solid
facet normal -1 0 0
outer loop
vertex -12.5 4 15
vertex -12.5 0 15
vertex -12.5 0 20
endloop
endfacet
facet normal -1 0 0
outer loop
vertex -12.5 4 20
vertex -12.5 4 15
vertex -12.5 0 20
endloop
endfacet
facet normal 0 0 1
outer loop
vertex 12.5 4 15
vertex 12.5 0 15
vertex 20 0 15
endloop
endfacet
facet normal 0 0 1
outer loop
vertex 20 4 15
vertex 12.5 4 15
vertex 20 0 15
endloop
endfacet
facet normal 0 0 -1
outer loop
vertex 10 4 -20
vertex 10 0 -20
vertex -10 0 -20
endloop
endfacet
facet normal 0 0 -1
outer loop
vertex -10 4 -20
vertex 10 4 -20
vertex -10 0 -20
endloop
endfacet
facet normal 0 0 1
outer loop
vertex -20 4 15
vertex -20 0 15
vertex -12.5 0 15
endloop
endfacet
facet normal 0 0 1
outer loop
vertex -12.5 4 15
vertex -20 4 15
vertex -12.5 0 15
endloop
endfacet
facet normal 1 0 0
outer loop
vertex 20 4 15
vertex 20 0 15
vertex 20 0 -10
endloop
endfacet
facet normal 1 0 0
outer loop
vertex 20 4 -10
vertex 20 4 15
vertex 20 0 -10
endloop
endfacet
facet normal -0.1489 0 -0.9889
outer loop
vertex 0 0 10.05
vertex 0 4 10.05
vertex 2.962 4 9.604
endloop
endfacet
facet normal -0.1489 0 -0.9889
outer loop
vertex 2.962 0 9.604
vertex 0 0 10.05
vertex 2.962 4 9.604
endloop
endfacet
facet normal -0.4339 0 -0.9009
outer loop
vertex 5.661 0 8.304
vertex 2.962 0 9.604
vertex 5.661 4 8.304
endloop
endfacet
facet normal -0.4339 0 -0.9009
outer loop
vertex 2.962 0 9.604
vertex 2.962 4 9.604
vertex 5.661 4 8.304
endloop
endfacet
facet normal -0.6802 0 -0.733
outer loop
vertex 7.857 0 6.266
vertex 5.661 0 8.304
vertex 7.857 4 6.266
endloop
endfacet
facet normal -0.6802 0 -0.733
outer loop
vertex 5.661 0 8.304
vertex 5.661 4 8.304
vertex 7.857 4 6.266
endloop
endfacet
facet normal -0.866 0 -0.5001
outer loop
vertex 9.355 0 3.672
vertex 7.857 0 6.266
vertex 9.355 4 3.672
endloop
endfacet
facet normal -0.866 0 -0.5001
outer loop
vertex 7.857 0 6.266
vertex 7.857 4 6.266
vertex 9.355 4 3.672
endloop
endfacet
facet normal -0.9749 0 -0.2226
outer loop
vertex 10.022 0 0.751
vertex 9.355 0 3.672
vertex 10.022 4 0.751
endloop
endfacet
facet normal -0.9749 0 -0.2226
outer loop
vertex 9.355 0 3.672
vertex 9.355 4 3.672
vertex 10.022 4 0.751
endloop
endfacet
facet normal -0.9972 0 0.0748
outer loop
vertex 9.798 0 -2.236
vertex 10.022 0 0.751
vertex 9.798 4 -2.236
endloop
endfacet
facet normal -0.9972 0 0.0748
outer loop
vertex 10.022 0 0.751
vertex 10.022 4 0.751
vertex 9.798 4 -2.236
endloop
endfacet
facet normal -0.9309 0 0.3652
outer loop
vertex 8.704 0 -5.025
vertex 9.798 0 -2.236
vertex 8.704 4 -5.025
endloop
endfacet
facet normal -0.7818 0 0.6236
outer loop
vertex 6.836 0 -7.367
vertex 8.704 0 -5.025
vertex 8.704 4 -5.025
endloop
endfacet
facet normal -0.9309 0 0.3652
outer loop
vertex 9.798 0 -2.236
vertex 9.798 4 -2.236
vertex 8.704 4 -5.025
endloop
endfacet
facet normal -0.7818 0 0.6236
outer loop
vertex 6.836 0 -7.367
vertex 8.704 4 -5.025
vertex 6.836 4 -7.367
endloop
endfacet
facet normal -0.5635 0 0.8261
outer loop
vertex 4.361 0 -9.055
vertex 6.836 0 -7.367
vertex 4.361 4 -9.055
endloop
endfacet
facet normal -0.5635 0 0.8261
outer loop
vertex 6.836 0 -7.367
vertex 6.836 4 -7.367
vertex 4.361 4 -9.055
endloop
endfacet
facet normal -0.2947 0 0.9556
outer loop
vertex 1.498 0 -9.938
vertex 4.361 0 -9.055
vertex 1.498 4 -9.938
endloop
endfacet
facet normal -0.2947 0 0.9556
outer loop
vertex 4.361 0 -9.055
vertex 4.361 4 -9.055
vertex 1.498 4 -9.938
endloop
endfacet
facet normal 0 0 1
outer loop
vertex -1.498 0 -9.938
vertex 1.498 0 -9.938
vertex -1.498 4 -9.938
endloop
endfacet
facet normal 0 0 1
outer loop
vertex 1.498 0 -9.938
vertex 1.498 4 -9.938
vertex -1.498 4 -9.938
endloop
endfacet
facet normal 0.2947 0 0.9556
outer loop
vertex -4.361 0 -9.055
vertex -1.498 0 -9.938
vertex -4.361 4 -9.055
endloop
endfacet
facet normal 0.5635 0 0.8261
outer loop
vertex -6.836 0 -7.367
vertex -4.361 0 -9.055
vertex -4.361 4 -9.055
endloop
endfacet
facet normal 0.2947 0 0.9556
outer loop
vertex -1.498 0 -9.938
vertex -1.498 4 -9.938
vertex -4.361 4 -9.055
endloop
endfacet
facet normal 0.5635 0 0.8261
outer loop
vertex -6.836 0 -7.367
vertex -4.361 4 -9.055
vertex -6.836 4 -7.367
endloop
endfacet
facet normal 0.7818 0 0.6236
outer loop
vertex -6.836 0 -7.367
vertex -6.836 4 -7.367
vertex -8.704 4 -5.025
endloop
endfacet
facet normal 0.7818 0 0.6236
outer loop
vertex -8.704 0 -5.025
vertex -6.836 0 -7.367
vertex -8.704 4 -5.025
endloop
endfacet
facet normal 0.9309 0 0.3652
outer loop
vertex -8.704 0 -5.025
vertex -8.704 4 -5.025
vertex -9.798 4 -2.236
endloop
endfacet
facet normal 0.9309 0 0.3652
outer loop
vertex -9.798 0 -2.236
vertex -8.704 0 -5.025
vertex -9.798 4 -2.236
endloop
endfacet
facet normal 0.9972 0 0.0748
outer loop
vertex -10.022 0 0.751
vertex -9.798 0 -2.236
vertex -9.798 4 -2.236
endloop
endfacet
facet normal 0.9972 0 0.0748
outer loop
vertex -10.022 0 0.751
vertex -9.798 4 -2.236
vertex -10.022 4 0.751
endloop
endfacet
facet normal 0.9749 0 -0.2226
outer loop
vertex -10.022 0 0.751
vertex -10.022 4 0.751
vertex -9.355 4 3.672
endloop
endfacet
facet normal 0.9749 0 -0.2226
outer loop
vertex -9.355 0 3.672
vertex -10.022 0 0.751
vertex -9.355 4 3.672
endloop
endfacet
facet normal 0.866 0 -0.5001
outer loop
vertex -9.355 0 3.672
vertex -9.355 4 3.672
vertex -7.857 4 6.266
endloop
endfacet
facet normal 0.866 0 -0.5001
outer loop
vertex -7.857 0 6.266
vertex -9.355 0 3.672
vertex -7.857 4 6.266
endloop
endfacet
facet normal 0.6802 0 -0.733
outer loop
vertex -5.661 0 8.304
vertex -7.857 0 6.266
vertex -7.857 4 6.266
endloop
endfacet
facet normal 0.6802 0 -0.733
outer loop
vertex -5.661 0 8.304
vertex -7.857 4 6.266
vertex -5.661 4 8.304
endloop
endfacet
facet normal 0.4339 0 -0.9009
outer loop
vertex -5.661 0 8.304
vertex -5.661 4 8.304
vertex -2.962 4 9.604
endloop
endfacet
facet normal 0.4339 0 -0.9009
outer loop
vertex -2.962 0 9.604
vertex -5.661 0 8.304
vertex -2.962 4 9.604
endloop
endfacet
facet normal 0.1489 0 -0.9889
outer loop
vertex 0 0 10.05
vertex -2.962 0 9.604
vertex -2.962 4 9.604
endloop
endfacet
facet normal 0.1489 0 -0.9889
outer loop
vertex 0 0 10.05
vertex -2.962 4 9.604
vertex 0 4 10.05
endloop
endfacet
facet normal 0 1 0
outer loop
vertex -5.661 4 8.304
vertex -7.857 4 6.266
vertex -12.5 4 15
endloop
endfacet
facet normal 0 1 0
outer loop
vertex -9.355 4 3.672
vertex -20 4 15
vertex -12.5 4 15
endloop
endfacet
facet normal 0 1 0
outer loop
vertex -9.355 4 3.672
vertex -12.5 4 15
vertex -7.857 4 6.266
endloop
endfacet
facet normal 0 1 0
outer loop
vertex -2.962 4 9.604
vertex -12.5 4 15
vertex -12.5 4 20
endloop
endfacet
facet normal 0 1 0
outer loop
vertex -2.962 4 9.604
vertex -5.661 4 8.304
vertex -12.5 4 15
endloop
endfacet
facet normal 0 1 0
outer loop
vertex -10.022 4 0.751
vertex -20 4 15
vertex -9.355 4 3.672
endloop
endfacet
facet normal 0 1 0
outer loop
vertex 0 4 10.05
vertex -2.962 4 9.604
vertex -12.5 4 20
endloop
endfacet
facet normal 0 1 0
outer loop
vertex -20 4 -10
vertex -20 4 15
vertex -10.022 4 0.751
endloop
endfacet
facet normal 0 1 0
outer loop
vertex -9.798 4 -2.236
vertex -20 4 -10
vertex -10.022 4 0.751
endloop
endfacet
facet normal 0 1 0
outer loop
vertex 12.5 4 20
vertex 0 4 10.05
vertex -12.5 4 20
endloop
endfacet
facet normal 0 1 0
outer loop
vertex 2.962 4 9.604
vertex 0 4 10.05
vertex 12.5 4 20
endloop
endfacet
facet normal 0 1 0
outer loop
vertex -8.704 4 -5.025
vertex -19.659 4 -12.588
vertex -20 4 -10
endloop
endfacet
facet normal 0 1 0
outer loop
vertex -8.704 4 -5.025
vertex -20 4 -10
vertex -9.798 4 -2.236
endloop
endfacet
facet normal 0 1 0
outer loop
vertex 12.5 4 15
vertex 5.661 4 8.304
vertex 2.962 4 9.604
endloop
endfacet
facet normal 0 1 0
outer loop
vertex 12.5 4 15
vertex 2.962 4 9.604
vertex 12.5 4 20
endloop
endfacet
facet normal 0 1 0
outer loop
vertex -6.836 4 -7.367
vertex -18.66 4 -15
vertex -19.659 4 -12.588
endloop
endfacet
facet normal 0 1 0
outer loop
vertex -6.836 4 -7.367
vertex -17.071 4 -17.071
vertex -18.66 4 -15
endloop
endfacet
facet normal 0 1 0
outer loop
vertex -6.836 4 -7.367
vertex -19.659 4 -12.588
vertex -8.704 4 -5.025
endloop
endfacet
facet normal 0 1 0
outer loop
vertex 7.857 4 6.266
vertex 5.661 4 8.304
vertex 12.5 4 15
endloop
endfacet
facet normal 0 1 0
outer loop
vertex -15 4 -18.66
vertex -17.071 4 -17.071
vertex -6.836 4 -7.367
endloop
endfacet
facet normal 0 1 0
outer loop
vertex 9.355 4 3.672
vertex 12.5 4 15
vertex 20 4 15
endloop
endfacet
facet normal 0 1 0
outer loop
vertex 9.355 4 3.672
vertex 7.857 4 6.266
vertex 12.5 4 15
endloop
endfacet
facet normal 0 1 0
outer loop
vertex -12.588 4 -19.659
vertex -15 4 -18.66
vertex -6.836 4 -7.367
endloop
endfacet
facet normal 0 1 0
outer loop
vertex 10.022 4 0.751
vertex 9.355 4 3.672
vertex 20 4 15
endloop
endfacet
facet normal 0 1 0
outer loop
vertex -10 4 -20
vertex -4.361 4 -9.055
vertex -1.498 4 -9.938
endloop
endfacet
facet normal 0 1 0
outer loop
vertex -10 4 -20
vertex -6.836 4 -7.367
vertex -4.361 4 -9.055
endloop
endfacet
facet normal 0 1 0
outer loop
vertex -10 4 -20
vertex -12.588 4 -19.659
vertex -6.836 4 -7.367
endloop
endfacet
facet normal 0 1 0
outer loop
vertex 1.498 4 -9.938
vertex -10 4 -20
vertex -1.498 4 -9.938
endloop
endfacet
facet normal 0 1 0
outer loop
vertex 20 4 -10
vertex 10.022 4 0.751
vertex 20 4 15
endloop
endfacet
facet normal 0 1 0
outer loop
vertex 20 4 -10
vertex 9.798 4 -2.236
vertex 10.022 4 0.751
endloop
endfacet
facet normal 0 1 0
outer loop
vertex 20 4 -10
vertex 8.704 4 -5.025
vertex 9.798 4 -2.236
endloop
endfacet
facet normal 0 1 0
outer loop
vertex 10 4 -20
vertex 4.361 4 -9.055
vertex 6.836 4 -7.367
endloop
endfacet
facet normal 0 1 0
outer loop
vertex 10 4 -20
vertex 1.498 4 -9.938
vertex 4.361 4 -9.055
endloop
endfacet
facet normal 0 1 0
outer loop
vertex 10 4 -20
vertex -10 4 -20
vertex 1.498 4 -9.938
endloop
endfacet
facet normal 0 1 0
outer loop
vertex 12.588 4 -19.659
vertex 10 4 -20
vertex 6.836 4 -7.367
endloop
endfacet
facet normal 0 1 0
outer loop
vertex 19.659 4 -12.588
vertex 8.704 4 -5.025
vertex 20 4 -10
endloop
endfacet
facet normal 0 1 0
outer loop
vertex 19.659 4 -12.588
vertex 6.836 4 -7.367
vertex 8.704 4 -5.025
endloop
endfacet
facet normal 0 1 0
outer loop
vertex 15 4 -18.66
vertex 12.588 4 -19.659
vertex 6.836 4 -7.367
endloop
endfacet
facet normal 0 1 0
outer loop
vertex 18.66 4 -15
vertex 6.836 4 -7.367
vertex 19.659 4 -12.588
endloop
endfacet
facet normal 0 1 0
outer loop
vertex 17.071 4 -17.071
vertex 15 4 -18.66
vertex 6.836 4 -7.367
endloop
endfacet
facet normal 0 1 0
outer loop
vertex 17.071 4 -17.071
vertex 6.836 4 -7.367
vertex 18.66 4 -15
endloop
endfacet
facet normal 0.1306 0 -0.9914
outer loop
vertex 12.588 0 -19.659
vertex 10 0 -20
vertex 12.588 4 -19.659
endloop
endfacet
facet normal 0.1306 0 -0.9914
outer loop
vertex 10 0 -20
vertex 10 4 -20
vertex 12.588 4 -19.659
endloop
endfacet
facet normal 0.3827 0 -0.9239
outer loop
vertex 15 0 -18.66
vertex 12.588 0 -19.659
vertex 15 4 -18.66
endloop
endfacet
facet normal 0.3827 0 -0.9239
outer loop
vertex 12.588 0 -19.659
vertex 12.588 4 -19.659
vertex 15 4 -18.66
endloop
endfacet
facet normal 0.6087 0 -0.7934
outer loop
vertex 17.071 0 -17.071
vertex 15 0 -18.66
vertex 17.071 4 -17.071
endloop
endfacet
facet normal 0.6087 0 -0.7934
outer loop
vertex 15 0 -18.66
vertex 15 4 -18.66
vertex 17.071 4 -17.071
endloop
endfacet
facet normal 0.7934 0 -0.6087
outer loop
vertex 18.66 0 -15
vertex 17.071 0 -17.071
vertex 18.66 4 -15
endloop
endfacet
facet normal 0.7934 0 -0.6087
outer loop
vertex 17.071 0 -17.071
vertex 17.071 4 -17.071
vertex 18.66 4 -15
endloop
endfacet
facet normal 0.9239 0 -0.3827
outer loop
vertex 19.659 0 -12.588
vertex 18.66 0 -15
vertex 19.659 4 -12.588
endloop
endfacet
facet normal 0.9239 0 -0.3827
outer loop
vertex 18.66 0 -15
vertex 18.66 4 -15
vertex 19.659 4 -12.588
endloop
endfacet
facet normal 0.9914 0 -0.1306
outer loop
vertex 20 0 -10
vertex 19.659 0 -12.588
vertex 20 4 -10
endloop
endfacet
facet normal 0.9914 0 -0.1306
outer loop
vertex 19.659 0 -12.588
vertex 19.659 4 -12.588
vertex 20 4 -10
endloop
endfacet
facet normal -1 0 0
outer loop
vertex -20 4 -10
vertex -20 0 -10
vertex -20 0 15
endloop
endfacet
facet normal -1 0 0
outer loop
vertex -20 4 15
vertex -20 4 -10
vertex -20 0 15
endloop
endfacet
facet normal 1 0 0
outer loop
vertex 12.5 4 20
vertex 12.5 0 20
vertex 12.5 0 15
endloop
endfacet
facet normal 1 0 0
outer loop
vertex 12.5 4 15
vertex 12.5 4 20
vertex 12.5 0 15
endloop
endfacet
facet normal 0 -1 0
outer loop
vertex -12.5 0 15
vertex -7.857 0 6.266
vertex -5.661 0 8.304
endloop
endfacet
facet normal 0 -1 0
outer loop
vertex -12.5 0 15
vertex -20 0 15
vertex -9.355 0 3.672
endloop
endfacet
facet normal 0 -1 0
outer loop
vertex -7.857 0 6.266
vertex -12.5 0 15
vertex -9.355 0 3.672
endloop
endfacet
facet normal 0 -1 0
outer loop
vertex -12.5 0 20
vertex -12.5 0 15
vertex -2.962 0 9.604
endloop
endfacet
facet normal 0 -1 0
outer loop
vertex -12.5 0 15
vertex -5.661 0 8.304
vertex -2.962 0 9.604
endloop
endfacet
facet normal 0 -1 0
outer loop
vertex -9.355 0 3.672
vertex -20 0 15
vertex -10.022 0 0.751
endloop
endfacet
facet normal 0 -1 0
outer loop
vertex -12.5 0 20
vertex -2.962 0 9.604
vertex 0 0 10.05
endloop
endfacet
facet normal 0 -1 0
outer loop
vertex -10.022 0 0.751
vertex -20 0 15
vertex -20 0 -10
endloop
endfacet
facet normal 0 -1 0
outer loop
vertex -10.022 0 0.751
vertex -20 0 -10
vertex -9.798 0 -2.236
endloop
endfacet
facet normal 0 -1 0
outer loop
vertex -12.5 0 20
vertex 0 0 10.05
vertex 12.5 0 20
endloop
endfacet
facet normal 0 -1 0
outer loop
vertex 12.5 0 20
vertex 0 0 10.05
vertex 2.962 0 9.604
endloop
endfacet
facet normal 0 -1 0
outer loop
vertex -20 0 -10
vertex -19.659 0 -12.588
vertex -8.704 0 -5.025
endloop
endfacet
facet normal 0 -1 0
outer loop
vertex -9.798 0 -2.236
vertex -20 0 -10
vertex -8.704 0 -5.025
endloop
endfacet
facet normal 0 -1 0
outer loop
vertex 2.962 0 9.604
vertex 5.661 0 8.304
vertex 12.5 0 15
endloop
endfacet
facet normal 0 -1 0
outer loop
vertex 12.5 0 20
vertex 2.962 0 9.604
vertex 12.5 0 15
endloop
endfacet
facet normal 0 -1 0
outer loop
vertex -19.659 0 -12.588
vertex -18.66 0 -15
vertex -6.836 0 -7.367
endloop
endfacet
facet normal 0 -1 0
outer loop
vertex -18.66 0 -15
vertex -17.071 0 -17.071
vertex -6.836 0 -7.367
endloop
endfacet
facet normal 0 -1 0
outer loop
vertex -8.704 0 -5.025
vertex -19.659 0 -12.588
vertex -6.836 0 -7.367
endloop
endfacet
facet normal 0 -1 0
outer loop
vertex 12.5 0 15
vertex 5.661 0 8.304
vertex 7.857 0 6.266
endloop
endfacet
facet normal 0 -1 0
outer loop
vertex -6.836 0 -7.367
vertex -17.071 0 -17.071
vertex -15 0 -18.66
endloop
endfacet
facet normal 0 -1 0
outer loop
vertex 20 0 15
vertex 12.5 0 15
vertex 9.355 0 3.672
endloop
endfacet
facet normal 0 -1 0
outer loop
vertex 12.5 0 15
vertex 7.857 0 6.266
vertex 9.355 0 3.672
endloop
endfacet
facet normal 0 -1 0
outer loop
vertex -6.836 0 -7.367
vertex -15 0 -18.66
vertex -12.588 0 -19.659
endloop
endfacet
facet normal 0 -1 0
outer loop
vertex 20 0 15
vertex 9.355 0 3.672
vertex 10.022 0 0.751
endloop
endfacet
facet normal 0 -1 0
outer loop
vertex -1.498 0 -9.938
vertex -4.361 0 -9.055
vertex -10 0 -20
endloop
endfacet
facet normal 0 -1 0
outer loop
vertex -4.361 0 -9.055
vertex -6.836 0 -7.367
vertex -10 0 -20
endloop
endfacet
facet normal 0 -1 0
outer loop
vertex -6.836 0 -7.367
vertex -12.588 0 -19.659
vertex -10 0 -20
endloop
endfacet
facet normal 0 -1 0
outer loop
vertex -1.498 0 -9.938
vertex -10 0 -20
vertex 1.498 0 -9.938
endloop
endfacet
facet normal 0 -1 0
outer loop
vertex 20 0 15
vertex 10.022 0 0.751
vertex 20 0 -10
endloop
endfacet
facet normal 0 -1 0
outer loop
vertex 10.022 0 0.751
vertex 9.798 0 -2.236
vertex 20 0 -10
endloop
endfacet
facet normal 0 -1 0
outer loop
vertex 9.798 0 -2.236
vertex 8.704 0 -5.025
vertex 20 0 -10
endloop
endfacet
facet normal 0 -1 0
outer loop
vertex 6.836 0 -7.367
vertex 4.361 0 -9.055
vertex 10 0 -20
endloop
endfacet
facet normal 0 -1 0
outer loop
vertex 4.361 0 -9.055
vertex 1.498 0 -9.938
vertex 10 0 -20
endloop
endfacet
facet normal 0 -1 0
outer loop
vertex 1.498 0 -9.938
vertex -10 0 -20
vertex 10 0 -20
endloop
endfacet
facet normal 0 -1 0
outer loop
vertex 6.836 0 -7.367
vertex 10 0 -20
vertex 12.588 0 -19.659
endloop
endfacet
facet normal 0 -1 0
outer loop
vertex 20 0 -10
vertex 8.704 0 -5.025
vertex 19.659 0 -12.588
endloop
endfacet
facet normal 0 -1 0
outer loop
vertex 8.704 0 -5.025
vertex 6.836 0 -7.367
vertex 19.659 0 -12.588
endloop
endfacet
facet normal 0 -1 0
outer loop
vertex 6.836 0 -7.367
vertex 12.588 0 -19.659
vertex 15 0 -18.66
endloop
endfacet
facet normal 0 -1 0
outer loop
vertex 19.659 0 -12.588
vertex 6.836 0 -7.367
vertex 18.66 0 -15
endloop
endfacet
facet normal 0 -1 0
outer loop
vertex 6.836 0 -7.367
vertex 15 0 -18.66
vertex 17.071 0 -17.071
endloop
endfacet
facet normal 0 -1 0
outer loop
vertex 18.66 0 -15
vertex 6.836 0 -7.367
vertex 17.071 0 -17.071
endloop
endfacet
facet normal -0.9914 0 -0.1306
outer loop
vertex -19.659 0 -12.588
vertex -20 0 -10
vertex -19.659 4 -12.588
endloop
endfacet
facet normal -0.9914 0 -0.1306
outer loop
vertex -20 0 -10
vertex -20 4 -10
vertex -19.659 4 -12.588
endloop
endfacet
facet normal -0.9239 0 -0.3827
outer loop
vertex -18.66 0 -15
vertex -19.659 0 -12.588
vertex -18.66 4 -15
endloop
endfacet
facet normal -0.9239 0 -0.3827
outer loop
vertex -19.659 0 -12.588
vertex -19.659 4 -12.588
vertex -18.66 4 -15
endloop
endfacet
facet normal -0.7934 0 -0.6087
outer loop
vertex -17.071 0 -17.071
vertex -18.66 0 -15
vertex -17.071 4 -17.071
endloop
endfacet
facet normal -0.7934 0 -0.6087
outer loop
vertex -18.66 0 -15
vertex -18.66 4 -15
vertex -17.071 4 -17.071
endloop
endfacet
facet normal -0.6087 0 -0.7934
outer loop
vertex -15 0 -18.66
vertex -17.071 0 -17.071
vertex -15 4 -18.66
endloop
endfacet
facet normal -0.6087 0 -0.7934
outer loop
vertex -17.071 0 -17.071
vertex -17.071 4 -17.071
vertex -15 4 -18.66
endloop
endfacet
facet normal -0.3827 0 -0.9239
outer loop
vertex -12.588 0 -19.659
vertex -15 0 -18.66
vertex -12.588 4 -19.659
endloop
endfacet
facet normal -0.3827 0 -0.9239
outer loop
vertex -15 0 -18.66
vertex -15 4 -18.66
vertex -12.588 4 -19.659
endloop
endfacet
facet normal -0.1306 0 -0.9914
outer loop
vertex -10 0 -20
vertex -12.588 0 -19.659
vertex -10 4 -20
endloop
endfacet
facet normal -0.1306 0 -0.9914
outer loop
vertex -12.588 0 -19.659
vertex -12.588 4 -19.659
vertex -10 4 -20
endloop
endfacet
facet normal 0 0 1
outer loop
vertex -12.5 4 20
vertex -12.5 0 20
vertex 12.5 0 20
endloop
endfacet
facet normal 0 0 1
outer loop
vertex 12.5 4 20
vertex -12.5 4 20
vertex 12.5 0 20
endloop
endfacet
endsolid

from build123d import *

# Parameters (mm, degrees)
EXTRUDE_1_DEPTH     = 4
SKETCH_5_R          = 10.05
CUT_EXTRUDE_4_DEPTH = 29.565713714
FILLET_1_R          = 10


with BuildPart() as part:
    # Эскиз1 → Бобышка-Вытянуть1 (new body)
    with BuildSketch(Plane(origin=(0, 0, 0), x_dir=(1, 0, 0), z_dir=(0, 1, 0))):
        Polygon((-20, -15), (-12.5, -15), (-12.5, -20), (12.5, -20), (12.5, -15), (20, -15), (20, 20), (-20, 20), align=None)
    extrude(amount=EXTRUDE_1_DEPTH)

    # Эскиз5 → Вырез-Вытянуть4 (cut, through all)
    with BuildSketch(Plane(origin=(0, 4, 0), x_dir=(1, 0, 0), z_dir=(0, 1, 0))):
        with Locations(Location((0, 0, 0), (0, 0, 270))):
            Circle(SKETCH_5_R)
    extrude(amount=-CUT_EXTRUDE_4_DEPTH, mode=Mode.SUBTRACT)

    # Скругление1
    fillet_1_edges = [part.edges().sort_by_distance(p)[0] for p in [
        (-20, 2, -20),
        (20, 2, -20),
    ]]
    fillet(fillet_1_edges, radius=FILLET_1_R)


solid = part.part
